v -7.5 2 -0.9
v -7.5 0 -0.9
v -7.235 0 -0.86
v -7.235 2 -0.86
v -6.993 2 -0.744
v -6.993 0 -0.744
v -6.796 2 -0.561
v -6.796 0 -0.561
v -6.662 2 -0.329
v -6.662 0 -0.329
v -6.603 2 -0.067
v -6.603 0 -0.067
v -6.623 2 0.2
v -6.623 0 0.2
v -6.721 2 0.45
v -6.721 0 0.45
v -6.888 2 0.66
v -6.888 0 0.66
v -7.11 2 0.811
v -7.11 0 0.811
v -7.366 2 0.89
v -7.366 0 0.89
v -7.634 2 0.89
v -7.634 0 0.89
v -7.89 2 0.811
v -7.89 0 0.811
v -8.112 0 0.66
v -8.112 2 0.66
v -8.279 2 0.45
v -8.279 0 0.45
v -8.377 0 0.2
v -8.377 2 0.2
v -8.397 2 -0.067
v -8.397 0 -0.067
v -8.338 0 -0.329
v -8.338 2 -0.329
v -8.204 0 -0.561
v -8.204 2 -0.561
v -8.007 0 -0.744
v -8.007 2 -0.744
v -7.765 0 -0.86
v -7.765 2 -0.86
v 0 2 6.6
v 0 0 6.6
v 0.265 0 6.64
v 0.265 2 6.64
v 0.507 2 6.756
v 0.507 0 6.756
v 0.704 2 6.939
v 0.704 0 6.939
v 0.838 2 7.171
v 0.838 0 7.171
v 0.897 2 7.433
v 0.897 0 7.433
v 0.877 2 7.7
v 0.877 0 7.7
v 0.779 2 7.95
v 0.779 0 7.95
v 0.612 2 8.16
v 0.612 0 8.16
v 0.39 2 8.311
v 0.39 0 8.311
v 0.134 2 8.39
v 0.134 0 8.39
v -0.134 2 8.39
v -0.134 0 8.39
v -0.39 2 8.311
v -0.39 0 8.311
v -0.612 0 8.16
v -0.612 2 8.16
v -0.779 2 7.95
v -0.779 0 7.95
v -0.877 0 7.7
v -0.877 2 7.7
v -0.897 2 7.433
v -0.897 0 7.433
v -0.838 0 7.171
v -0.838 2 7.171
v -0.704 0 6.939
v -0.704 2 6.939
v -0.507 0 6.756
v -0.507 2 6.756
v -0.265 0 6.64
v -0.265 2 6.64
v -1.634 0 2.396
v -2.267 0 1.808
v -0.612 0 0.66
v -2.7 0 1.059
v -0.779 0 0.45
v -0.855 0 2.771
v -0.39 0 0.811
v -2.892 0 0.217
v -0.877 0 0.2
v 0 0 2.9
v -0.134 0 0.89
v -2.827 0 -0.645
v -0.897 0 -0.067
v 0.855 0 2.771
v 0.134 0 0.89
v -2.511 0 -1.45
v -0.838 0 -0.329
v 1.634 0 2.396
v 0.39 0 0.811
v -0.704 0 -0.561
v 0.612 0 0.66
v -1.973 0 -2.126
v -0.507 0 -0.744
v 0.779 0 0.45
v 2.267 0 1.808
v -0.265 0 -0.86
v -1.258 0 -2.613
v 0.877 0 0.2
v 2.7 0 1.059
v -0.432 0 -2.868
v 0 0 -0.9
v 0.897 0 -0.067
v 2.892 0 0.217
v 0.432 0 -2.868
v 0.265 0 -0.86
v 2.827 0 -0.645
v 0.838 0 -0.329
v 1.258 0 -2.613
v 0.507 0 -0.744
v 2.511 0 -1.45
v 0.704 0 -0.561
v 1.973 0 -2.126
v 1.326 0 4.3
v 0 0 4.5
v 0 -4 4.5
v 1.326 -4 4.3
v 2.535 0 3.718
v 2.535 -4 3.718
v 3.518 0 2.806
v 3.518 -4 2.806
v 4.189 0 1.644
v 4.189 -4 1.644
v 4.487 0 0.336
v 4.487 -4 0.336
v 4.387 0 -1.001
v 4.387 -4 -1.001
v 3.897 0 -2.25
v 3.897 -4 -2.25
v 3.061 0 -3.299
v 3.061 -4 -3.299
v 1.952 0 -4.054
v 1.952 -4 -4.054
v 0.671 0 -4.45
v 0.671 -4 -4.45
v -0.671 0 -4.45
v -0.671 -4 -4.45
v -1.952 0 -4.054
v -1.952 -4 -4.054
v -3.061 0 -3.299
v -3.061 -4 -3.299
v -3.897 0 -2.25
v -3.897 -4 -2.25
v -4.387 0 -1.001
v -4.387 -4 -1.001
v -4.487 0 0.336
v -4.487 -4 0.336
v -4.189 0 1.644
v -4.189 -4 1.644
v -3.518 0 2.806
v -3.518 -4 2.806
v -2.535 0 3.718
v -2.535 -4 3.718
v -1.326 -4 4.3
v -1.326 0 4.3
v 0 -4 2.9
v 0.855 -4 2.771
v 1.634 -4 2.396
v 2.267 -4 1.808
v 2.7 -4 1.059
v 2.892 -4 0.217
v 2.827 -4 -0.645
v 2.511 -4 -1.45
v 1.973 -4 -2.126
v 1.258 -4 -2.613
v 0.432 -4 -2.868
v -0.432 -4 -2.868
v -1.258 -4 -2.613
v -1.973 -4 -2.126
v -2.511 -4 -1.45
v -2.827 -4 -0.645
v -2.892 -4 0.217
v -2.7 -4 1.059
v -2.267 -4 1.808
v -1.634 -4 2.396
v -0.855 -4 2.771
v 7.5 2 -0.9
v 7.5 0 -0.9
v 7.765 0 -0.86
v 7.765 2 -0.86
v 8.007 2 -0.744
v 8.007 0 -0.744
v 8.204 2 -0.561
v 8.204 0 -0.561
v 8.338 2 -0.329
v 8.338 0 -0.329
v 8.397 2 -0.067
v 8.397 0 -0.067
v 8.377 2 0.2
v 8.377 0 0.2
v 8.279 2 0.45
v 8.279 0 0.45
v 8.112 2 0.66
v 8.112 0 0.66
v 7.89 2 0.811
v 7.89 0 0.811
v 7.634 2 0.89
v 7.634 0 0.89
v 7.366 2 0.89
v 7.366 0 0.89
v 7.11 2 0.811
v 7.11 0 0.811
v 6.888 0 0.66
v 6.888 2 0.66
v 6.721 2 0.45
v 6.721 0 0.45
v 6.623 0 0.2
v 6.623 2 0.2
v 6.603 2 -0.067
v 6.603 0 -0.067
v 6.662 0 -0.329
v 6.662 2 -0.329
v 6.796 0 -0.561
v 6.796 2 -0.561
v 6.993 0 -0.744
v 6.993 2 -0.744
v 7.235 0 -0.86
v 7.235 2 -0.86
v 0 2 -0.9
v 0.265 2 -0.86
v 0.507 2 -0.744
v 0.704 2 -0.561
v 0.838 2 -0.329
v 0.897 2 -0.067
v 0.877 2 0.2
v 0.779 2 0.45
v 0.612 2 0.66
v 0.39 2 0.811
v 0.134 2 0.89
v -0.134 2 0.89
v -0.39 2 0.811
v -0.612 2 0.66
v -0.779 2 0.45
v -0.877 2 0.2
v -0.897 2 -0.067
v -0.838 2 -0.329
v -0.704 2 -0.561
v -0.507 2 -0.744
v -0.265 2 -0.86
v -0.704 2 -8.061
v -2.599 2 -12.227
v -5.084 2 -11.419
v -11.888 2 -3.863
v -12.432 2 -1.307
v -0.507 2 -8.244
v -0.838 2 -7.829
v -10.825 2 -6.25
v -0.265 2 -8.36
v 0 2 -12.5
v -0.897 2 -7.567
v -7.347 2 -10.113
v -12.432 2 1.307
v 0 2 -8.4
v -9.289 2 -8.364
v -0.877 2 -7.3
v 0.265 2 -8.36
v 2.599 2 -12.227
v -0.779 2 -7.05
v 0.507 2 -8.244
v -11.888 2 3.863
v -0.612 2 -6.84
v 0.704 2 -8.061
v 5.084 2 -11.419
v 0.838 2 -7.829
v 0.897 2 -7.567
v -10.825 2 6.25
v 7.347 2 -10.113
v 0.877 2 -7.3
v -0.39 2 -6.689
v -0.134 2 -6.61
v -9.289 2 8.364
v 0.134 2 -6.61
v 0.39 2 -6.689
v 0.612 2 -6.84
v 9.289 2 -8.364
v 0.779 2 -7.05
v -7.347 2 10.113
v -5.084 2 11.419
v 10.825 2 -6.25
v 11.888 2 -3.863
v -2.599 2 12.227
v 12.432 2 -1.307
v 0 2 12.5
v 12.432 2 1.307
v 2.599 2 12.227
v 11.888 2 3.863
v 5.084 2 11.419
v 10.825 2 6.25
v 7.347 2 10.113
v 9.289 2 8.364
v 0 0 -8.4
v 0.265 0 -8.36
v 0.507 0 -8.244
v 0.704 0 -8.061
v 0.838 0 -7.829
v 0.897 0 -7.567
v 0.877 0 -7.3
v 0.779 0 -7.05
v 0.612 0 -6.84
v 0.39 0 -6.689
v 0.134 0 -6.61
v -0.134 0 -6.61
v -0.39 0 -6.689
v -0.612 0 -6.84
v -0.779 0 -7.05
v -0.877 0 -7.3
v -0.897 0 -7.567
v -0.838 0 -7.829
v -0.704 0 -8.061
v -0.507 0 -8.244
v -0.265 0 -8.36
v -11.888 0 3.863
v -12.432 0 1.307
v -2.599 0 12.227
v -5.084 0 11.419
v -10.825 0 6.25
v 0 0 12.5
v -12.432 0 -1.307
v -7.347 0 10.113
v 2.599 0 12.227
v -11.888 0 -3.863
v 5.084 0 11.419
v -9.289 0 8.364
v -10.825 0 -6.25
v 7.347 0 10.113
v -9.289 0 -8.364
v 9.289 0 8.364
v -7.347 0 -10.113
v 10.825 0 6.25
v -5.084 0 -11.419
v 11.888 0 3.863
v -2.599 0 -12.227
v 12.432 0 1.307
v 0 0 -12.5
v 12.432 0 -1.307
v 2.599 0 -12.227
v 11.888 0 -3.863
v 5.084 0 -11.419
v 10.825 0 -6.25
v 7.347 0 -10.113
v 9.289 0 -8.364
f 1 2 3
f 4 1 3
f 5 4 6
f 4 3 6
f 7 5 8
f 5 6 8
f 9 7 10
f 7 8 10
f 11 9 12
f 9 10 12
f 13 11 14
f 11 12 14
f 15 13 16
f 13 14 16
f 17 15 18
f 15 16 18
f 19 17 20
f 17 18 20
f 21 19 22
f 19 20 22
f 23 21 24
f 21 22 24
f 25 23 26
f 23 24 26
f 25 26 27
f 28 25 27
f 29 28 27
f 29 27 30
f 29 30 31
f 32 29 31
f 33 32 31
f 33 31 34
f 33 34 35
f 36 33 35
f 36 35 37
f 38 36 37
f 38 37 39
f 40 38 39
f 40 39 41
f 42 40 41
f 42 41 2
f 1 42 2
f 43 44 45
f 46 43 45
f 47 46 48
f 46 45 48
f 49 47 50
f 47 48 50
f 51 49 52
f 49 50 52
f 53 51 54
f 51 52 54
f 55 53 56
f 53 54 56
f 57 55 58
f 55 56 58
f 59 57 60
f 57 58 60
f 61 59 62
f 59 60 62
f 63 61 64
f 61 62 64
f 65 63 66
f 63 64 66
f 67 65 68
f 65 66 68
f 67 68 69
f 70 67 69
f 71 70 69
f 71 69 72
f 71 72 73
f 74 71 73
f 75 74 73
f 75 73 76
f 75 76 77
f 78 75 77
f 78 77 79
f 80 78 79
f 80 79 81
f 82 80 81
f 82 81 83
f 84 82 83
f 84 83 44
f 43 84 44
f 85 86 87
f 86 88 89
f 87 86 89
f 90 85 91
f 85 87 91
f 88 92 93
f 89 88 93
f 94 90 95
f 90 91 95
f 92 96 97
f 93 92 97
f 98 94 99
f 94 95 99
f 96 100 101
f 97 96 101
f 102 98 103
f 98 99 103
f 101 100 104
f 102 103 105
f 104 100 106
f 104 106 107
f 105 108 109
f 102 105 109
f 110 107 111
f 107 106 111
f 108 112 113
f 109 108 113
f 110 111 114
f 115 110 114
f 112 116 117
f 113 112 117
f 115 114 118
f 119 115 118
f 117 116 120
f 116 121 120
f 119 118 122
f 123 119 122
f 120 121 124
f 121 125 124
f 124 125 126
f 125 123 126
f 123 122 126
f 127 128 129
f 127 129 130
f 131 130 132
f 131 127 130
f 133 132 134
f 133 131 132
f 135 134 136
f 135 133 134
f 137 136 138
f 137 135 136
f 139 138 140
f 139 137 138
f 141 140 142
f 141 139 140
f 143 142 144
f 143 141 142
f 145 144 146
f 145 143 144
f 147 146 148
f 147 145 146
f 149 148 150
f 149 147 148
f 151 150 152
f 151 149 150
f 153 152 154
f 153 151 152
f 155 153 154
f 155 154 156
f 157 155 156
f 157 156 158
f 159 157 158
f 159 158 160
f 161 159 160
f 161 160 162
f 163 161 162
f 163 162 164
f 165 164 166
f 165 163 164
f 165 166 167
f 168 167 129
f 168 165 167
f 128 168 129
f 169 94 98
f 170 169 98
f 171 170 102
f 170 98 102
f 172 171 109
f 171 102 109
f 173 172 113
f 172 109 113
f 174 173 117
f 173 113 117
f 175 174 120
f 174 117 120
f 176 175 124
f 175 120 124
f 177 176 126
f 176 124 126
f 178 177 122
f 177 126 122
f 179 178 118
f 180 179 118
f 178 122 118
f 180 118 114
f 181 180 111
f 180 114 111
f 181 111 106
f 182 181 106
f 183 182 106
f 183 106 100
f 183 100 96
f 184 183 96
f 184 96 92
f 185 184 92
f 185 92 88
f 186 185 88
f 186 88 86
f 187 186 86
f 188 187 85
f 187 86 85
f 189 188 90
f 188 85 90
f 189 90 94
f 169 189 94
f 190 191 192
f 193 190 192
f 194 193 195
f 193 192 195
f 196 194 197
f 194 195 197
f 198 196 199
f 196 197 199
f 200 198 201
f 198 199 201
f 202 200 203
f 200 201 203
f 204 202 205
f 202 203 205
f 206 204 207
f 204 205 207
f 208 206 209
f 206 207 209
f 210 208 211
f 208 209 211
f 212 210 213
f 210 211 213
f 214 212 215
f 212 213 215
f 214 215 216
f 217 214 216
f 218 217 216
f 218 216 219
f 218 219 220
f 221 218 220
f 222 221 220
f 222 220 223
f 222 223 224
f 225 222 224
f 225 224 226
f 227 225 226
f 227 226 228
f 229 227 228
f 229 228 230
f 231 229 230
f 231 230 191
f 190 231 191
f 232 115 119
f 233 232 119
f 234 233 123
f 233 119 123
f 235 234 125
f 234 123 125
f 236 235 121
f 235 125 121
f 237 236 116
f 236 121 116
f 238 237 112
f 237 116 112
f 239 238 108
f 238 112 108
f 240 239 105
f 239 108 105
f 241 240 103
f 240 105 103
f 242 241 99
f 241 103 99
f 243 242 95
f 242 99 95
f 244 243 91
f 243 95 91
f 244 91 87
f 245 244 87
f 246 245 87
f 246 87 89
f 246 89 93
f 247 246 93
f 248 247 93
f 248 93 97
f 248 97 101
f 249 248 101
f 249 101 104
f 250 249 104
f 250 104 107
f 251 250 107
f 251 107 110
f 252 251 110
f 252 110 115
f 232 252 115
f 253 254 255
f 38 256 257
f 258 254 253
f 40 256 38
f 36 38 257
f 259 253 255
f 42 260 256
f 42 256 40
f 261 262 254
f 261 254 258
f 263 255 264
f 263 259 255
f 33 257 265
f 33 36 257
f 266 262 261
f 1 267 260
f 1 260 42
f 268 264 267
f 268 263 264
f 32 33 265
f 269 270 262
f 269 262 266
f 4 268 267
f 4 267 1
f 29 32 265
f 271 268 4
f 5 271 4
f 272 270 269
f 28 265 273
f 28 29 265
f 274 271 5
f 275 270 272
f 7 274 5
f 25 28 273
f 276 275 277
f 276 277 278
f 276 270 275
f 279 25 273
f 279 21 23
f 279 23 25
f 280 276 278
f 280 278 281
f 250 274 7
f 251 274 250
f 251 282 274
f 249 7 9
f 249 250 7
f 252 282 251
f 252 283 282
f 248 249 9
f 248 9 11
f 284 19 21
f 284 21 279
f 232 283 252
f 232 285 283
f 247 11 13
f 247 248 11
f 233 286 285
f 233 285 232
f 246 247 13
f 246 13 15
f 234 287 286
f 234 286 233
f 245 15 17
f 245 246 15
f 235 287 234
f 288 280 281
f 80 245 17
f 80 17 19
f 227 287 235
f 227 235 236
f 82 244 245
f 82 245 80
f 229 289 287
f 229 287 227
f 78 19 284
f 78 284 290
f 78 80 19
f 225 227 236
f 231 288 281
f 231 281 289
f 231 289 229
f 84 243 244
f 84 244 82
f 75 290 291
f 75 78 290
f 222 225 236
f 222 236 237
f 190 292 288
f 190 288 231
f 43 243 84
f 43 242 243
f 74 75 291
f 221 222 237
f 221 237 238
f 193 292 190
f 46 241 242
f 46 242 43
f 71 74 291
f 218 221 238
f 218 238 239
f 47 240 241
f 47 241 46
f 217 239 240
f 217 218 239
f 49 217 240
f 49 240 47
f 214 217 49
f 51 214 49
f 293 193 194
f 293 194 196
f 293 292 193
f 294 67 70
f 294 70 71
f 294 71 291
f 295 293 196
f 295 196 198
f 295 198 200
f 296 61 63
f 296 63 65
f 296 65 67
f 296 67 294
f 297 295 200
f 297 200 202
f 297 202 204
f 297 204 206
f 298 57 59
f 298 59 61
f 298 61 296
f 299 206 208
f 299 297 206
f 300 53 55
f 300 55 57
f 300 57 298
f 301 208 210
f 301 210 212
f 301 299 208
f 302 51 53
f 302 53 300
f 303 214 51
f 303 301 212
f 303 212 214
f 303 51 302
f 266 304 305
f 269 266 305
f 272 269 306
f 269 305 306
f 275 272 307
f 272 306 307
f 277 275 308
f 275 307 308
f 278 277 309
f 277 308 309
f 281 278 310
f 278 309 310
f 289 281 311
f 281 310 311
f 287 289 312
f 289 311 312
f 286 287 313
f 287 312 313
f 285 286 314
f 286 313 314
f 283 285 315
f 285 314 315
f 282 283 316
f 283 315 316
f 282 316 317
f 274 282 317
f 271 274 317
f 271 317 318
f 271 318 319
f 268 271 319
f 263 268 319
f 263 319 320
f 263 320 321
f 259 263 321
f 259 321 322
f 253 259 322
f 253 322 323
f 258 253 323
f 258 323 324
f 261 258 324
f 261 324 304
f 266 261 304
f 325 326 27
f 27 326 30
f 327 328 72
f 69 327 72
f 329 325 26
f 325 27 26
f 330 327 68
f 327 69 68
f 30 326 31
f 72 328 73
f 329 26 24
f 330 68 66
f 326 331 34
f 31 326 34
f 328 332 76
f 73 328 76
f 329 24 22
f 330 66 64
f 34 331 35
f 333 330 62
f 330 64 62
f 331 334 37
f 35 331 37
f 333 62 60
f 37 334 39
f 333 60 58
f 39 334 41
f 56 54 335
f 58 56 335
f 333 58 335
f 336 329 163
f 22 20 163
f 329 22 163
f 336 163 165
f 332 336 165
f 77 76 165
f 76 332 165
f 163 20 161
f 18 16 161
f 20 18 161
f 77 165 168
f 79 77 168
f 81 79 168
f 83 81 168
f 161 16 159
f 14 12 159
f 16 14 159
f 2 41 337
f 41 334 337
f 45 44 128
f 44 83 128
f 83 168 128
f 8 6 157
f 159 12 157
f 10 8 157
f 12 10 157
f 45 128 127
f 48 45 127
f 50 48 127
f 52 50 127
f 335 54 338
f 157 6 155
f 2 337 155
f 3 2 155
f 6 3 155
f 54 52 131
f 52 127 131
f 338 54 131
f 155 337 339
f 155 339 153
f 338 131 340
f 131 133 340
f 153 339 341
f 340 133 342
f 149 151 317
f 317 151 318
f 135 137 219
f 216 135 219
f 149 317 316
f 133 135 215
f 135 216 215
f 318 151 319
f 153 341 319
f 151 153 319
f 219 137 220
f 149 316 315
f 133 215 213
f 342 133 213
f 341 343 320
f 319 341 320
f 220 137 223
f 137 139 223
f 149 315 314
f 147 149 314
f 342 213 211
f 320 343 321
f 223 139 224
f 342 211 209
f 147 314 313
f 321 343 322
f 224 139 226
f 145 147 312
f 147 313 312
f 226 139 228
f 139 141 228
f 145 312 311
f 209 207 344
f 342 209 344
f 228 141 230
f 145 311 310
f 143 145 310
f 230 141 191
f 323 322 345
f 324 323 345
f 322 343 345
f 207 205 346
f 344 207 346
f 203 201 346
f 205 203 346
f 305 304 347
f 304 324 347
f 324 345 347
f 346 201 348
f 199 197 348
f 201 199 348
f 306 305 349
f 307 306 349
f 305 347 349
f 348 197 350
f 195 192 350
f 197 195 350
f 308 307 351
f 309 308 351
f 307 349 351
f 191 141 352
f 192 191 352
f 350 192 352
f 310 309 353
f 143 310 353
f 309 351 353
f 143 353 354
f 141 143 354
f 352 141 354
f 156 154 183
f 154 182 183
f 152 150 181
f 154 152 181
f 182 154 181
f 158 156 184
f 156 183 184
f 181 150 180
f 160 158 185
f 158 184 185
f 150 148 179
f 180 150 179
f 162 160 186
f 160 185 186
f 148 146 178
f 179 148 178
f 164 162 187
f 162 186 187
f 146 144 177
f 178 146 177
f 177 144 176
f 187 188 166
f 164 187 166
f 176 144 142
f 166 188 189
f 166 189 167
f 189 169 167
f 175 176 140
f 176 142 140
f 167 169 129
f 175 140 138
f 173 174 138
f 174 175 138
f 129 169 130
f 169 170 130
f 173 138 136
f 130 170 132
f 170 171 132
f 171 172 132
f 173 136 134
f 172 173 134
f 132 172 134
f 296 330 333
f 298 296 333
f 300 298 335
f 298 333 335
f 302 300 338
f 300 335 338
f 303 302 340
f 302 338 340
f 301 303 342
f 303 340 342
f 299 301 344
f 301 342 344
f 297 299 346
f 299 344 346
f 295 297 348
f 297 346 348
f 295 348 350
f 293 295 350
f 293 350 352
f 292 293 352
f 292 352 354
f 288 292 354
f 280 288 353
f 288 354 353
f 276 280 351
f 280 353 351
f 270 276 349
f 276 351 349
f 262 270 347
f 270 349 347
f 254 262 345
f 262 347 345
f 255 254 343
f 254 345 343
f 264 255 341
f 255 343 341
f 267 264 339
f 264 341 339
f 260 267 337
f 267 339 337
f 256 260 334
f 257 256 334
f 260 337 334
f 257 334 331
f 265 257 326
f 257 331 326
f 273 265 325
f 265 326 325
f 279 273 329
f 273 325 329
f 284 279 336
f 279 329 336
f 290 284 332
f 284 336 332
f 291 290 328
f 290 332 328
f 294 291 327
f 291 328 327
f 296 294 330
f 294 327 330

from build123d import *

# Parameters (mm, degrees)
CROQUIS1_R                     = 12.5
CROQUIS1_R_2                   = 4.5
CROQUIS1_R_3                   = 2.9
SALIENTE_EXTRUIR1_DEPTH        = 2
CROQUIS1_3_R                   = 4.5
CROQUIS1_3_R_2                 = 2.9
SALIENTE_EXTRUIR2_DEPTH        = 4
TALADRO_DE_MARGEN_PARA_M1_61_D = 1.8


with BuildPart() as part:
    # Croquis1 → Saliente-Extruir1 (new body)
    # profile 1 of 3: a face of its own
    with BuildSketch(Plane(origin=(0, 0, 0), x_dir=(1, 0, 0), z_dir=(0, 1, 0))):
        with Locations(Location((0, 0, 0), (0, 0, 270))):
            Circle(CROQUIS1_R)
        Circle(CROQUIS1_R_2, mode=Mode.SUBTRACT)
    # profile 2 of 3: a face of its own
    with BuildSketch(Plane(origin=(0, 0, 0), x_dir=(1, 0, 0), z_dir=(0, 1, 0))):
        Circle(CROQUIS1_R_2)
        Circle(CROQUIS1_R_3, mode=Mode.SUBTRACT)
    # profile 3 of 3: a face of its own
    with BuildSketch(Plane(origin=(0, 0, 0), x_dir=(1, 0, 0), z_dir=(0, 1, 0))):
        Circle(CROQUIS1_R_3)
    extrude(amount=SALIENTE_EXTRUIR1_DEPTH)

    # Croquis1<3> → Saliente-Extruir2 (add)
    with BuildSketch(Plane(origin=(0, 0, 0), x_dir=(1, 0, 0), z_dir=(0, 1, 0))):
        with Locations(Location((0, 0, 0), (0, 0, 270))):
            Circle(CROQUIS1_3_R)
        with Locations(Location((0, 0, 0), (0, 0, 270))):
            Circle(CROQUIS1_3_R_2, mode=Mode.SUBTRACT)
    extrude(amount=-SALIENTE_EXTRUIR2_DEPTH)

    # Taladro de margen para M1.61 (through all)
    with Locations(Plane.ZX.offset(2)):
        with Locations((0, 0), (-7.5, 0), (0, 7.5), (7.5, 0), (0, -7.5)):
            Hole(TALADRO_DE_MARGEN_PARA_M1_61_D / 2)


solid = part.part
